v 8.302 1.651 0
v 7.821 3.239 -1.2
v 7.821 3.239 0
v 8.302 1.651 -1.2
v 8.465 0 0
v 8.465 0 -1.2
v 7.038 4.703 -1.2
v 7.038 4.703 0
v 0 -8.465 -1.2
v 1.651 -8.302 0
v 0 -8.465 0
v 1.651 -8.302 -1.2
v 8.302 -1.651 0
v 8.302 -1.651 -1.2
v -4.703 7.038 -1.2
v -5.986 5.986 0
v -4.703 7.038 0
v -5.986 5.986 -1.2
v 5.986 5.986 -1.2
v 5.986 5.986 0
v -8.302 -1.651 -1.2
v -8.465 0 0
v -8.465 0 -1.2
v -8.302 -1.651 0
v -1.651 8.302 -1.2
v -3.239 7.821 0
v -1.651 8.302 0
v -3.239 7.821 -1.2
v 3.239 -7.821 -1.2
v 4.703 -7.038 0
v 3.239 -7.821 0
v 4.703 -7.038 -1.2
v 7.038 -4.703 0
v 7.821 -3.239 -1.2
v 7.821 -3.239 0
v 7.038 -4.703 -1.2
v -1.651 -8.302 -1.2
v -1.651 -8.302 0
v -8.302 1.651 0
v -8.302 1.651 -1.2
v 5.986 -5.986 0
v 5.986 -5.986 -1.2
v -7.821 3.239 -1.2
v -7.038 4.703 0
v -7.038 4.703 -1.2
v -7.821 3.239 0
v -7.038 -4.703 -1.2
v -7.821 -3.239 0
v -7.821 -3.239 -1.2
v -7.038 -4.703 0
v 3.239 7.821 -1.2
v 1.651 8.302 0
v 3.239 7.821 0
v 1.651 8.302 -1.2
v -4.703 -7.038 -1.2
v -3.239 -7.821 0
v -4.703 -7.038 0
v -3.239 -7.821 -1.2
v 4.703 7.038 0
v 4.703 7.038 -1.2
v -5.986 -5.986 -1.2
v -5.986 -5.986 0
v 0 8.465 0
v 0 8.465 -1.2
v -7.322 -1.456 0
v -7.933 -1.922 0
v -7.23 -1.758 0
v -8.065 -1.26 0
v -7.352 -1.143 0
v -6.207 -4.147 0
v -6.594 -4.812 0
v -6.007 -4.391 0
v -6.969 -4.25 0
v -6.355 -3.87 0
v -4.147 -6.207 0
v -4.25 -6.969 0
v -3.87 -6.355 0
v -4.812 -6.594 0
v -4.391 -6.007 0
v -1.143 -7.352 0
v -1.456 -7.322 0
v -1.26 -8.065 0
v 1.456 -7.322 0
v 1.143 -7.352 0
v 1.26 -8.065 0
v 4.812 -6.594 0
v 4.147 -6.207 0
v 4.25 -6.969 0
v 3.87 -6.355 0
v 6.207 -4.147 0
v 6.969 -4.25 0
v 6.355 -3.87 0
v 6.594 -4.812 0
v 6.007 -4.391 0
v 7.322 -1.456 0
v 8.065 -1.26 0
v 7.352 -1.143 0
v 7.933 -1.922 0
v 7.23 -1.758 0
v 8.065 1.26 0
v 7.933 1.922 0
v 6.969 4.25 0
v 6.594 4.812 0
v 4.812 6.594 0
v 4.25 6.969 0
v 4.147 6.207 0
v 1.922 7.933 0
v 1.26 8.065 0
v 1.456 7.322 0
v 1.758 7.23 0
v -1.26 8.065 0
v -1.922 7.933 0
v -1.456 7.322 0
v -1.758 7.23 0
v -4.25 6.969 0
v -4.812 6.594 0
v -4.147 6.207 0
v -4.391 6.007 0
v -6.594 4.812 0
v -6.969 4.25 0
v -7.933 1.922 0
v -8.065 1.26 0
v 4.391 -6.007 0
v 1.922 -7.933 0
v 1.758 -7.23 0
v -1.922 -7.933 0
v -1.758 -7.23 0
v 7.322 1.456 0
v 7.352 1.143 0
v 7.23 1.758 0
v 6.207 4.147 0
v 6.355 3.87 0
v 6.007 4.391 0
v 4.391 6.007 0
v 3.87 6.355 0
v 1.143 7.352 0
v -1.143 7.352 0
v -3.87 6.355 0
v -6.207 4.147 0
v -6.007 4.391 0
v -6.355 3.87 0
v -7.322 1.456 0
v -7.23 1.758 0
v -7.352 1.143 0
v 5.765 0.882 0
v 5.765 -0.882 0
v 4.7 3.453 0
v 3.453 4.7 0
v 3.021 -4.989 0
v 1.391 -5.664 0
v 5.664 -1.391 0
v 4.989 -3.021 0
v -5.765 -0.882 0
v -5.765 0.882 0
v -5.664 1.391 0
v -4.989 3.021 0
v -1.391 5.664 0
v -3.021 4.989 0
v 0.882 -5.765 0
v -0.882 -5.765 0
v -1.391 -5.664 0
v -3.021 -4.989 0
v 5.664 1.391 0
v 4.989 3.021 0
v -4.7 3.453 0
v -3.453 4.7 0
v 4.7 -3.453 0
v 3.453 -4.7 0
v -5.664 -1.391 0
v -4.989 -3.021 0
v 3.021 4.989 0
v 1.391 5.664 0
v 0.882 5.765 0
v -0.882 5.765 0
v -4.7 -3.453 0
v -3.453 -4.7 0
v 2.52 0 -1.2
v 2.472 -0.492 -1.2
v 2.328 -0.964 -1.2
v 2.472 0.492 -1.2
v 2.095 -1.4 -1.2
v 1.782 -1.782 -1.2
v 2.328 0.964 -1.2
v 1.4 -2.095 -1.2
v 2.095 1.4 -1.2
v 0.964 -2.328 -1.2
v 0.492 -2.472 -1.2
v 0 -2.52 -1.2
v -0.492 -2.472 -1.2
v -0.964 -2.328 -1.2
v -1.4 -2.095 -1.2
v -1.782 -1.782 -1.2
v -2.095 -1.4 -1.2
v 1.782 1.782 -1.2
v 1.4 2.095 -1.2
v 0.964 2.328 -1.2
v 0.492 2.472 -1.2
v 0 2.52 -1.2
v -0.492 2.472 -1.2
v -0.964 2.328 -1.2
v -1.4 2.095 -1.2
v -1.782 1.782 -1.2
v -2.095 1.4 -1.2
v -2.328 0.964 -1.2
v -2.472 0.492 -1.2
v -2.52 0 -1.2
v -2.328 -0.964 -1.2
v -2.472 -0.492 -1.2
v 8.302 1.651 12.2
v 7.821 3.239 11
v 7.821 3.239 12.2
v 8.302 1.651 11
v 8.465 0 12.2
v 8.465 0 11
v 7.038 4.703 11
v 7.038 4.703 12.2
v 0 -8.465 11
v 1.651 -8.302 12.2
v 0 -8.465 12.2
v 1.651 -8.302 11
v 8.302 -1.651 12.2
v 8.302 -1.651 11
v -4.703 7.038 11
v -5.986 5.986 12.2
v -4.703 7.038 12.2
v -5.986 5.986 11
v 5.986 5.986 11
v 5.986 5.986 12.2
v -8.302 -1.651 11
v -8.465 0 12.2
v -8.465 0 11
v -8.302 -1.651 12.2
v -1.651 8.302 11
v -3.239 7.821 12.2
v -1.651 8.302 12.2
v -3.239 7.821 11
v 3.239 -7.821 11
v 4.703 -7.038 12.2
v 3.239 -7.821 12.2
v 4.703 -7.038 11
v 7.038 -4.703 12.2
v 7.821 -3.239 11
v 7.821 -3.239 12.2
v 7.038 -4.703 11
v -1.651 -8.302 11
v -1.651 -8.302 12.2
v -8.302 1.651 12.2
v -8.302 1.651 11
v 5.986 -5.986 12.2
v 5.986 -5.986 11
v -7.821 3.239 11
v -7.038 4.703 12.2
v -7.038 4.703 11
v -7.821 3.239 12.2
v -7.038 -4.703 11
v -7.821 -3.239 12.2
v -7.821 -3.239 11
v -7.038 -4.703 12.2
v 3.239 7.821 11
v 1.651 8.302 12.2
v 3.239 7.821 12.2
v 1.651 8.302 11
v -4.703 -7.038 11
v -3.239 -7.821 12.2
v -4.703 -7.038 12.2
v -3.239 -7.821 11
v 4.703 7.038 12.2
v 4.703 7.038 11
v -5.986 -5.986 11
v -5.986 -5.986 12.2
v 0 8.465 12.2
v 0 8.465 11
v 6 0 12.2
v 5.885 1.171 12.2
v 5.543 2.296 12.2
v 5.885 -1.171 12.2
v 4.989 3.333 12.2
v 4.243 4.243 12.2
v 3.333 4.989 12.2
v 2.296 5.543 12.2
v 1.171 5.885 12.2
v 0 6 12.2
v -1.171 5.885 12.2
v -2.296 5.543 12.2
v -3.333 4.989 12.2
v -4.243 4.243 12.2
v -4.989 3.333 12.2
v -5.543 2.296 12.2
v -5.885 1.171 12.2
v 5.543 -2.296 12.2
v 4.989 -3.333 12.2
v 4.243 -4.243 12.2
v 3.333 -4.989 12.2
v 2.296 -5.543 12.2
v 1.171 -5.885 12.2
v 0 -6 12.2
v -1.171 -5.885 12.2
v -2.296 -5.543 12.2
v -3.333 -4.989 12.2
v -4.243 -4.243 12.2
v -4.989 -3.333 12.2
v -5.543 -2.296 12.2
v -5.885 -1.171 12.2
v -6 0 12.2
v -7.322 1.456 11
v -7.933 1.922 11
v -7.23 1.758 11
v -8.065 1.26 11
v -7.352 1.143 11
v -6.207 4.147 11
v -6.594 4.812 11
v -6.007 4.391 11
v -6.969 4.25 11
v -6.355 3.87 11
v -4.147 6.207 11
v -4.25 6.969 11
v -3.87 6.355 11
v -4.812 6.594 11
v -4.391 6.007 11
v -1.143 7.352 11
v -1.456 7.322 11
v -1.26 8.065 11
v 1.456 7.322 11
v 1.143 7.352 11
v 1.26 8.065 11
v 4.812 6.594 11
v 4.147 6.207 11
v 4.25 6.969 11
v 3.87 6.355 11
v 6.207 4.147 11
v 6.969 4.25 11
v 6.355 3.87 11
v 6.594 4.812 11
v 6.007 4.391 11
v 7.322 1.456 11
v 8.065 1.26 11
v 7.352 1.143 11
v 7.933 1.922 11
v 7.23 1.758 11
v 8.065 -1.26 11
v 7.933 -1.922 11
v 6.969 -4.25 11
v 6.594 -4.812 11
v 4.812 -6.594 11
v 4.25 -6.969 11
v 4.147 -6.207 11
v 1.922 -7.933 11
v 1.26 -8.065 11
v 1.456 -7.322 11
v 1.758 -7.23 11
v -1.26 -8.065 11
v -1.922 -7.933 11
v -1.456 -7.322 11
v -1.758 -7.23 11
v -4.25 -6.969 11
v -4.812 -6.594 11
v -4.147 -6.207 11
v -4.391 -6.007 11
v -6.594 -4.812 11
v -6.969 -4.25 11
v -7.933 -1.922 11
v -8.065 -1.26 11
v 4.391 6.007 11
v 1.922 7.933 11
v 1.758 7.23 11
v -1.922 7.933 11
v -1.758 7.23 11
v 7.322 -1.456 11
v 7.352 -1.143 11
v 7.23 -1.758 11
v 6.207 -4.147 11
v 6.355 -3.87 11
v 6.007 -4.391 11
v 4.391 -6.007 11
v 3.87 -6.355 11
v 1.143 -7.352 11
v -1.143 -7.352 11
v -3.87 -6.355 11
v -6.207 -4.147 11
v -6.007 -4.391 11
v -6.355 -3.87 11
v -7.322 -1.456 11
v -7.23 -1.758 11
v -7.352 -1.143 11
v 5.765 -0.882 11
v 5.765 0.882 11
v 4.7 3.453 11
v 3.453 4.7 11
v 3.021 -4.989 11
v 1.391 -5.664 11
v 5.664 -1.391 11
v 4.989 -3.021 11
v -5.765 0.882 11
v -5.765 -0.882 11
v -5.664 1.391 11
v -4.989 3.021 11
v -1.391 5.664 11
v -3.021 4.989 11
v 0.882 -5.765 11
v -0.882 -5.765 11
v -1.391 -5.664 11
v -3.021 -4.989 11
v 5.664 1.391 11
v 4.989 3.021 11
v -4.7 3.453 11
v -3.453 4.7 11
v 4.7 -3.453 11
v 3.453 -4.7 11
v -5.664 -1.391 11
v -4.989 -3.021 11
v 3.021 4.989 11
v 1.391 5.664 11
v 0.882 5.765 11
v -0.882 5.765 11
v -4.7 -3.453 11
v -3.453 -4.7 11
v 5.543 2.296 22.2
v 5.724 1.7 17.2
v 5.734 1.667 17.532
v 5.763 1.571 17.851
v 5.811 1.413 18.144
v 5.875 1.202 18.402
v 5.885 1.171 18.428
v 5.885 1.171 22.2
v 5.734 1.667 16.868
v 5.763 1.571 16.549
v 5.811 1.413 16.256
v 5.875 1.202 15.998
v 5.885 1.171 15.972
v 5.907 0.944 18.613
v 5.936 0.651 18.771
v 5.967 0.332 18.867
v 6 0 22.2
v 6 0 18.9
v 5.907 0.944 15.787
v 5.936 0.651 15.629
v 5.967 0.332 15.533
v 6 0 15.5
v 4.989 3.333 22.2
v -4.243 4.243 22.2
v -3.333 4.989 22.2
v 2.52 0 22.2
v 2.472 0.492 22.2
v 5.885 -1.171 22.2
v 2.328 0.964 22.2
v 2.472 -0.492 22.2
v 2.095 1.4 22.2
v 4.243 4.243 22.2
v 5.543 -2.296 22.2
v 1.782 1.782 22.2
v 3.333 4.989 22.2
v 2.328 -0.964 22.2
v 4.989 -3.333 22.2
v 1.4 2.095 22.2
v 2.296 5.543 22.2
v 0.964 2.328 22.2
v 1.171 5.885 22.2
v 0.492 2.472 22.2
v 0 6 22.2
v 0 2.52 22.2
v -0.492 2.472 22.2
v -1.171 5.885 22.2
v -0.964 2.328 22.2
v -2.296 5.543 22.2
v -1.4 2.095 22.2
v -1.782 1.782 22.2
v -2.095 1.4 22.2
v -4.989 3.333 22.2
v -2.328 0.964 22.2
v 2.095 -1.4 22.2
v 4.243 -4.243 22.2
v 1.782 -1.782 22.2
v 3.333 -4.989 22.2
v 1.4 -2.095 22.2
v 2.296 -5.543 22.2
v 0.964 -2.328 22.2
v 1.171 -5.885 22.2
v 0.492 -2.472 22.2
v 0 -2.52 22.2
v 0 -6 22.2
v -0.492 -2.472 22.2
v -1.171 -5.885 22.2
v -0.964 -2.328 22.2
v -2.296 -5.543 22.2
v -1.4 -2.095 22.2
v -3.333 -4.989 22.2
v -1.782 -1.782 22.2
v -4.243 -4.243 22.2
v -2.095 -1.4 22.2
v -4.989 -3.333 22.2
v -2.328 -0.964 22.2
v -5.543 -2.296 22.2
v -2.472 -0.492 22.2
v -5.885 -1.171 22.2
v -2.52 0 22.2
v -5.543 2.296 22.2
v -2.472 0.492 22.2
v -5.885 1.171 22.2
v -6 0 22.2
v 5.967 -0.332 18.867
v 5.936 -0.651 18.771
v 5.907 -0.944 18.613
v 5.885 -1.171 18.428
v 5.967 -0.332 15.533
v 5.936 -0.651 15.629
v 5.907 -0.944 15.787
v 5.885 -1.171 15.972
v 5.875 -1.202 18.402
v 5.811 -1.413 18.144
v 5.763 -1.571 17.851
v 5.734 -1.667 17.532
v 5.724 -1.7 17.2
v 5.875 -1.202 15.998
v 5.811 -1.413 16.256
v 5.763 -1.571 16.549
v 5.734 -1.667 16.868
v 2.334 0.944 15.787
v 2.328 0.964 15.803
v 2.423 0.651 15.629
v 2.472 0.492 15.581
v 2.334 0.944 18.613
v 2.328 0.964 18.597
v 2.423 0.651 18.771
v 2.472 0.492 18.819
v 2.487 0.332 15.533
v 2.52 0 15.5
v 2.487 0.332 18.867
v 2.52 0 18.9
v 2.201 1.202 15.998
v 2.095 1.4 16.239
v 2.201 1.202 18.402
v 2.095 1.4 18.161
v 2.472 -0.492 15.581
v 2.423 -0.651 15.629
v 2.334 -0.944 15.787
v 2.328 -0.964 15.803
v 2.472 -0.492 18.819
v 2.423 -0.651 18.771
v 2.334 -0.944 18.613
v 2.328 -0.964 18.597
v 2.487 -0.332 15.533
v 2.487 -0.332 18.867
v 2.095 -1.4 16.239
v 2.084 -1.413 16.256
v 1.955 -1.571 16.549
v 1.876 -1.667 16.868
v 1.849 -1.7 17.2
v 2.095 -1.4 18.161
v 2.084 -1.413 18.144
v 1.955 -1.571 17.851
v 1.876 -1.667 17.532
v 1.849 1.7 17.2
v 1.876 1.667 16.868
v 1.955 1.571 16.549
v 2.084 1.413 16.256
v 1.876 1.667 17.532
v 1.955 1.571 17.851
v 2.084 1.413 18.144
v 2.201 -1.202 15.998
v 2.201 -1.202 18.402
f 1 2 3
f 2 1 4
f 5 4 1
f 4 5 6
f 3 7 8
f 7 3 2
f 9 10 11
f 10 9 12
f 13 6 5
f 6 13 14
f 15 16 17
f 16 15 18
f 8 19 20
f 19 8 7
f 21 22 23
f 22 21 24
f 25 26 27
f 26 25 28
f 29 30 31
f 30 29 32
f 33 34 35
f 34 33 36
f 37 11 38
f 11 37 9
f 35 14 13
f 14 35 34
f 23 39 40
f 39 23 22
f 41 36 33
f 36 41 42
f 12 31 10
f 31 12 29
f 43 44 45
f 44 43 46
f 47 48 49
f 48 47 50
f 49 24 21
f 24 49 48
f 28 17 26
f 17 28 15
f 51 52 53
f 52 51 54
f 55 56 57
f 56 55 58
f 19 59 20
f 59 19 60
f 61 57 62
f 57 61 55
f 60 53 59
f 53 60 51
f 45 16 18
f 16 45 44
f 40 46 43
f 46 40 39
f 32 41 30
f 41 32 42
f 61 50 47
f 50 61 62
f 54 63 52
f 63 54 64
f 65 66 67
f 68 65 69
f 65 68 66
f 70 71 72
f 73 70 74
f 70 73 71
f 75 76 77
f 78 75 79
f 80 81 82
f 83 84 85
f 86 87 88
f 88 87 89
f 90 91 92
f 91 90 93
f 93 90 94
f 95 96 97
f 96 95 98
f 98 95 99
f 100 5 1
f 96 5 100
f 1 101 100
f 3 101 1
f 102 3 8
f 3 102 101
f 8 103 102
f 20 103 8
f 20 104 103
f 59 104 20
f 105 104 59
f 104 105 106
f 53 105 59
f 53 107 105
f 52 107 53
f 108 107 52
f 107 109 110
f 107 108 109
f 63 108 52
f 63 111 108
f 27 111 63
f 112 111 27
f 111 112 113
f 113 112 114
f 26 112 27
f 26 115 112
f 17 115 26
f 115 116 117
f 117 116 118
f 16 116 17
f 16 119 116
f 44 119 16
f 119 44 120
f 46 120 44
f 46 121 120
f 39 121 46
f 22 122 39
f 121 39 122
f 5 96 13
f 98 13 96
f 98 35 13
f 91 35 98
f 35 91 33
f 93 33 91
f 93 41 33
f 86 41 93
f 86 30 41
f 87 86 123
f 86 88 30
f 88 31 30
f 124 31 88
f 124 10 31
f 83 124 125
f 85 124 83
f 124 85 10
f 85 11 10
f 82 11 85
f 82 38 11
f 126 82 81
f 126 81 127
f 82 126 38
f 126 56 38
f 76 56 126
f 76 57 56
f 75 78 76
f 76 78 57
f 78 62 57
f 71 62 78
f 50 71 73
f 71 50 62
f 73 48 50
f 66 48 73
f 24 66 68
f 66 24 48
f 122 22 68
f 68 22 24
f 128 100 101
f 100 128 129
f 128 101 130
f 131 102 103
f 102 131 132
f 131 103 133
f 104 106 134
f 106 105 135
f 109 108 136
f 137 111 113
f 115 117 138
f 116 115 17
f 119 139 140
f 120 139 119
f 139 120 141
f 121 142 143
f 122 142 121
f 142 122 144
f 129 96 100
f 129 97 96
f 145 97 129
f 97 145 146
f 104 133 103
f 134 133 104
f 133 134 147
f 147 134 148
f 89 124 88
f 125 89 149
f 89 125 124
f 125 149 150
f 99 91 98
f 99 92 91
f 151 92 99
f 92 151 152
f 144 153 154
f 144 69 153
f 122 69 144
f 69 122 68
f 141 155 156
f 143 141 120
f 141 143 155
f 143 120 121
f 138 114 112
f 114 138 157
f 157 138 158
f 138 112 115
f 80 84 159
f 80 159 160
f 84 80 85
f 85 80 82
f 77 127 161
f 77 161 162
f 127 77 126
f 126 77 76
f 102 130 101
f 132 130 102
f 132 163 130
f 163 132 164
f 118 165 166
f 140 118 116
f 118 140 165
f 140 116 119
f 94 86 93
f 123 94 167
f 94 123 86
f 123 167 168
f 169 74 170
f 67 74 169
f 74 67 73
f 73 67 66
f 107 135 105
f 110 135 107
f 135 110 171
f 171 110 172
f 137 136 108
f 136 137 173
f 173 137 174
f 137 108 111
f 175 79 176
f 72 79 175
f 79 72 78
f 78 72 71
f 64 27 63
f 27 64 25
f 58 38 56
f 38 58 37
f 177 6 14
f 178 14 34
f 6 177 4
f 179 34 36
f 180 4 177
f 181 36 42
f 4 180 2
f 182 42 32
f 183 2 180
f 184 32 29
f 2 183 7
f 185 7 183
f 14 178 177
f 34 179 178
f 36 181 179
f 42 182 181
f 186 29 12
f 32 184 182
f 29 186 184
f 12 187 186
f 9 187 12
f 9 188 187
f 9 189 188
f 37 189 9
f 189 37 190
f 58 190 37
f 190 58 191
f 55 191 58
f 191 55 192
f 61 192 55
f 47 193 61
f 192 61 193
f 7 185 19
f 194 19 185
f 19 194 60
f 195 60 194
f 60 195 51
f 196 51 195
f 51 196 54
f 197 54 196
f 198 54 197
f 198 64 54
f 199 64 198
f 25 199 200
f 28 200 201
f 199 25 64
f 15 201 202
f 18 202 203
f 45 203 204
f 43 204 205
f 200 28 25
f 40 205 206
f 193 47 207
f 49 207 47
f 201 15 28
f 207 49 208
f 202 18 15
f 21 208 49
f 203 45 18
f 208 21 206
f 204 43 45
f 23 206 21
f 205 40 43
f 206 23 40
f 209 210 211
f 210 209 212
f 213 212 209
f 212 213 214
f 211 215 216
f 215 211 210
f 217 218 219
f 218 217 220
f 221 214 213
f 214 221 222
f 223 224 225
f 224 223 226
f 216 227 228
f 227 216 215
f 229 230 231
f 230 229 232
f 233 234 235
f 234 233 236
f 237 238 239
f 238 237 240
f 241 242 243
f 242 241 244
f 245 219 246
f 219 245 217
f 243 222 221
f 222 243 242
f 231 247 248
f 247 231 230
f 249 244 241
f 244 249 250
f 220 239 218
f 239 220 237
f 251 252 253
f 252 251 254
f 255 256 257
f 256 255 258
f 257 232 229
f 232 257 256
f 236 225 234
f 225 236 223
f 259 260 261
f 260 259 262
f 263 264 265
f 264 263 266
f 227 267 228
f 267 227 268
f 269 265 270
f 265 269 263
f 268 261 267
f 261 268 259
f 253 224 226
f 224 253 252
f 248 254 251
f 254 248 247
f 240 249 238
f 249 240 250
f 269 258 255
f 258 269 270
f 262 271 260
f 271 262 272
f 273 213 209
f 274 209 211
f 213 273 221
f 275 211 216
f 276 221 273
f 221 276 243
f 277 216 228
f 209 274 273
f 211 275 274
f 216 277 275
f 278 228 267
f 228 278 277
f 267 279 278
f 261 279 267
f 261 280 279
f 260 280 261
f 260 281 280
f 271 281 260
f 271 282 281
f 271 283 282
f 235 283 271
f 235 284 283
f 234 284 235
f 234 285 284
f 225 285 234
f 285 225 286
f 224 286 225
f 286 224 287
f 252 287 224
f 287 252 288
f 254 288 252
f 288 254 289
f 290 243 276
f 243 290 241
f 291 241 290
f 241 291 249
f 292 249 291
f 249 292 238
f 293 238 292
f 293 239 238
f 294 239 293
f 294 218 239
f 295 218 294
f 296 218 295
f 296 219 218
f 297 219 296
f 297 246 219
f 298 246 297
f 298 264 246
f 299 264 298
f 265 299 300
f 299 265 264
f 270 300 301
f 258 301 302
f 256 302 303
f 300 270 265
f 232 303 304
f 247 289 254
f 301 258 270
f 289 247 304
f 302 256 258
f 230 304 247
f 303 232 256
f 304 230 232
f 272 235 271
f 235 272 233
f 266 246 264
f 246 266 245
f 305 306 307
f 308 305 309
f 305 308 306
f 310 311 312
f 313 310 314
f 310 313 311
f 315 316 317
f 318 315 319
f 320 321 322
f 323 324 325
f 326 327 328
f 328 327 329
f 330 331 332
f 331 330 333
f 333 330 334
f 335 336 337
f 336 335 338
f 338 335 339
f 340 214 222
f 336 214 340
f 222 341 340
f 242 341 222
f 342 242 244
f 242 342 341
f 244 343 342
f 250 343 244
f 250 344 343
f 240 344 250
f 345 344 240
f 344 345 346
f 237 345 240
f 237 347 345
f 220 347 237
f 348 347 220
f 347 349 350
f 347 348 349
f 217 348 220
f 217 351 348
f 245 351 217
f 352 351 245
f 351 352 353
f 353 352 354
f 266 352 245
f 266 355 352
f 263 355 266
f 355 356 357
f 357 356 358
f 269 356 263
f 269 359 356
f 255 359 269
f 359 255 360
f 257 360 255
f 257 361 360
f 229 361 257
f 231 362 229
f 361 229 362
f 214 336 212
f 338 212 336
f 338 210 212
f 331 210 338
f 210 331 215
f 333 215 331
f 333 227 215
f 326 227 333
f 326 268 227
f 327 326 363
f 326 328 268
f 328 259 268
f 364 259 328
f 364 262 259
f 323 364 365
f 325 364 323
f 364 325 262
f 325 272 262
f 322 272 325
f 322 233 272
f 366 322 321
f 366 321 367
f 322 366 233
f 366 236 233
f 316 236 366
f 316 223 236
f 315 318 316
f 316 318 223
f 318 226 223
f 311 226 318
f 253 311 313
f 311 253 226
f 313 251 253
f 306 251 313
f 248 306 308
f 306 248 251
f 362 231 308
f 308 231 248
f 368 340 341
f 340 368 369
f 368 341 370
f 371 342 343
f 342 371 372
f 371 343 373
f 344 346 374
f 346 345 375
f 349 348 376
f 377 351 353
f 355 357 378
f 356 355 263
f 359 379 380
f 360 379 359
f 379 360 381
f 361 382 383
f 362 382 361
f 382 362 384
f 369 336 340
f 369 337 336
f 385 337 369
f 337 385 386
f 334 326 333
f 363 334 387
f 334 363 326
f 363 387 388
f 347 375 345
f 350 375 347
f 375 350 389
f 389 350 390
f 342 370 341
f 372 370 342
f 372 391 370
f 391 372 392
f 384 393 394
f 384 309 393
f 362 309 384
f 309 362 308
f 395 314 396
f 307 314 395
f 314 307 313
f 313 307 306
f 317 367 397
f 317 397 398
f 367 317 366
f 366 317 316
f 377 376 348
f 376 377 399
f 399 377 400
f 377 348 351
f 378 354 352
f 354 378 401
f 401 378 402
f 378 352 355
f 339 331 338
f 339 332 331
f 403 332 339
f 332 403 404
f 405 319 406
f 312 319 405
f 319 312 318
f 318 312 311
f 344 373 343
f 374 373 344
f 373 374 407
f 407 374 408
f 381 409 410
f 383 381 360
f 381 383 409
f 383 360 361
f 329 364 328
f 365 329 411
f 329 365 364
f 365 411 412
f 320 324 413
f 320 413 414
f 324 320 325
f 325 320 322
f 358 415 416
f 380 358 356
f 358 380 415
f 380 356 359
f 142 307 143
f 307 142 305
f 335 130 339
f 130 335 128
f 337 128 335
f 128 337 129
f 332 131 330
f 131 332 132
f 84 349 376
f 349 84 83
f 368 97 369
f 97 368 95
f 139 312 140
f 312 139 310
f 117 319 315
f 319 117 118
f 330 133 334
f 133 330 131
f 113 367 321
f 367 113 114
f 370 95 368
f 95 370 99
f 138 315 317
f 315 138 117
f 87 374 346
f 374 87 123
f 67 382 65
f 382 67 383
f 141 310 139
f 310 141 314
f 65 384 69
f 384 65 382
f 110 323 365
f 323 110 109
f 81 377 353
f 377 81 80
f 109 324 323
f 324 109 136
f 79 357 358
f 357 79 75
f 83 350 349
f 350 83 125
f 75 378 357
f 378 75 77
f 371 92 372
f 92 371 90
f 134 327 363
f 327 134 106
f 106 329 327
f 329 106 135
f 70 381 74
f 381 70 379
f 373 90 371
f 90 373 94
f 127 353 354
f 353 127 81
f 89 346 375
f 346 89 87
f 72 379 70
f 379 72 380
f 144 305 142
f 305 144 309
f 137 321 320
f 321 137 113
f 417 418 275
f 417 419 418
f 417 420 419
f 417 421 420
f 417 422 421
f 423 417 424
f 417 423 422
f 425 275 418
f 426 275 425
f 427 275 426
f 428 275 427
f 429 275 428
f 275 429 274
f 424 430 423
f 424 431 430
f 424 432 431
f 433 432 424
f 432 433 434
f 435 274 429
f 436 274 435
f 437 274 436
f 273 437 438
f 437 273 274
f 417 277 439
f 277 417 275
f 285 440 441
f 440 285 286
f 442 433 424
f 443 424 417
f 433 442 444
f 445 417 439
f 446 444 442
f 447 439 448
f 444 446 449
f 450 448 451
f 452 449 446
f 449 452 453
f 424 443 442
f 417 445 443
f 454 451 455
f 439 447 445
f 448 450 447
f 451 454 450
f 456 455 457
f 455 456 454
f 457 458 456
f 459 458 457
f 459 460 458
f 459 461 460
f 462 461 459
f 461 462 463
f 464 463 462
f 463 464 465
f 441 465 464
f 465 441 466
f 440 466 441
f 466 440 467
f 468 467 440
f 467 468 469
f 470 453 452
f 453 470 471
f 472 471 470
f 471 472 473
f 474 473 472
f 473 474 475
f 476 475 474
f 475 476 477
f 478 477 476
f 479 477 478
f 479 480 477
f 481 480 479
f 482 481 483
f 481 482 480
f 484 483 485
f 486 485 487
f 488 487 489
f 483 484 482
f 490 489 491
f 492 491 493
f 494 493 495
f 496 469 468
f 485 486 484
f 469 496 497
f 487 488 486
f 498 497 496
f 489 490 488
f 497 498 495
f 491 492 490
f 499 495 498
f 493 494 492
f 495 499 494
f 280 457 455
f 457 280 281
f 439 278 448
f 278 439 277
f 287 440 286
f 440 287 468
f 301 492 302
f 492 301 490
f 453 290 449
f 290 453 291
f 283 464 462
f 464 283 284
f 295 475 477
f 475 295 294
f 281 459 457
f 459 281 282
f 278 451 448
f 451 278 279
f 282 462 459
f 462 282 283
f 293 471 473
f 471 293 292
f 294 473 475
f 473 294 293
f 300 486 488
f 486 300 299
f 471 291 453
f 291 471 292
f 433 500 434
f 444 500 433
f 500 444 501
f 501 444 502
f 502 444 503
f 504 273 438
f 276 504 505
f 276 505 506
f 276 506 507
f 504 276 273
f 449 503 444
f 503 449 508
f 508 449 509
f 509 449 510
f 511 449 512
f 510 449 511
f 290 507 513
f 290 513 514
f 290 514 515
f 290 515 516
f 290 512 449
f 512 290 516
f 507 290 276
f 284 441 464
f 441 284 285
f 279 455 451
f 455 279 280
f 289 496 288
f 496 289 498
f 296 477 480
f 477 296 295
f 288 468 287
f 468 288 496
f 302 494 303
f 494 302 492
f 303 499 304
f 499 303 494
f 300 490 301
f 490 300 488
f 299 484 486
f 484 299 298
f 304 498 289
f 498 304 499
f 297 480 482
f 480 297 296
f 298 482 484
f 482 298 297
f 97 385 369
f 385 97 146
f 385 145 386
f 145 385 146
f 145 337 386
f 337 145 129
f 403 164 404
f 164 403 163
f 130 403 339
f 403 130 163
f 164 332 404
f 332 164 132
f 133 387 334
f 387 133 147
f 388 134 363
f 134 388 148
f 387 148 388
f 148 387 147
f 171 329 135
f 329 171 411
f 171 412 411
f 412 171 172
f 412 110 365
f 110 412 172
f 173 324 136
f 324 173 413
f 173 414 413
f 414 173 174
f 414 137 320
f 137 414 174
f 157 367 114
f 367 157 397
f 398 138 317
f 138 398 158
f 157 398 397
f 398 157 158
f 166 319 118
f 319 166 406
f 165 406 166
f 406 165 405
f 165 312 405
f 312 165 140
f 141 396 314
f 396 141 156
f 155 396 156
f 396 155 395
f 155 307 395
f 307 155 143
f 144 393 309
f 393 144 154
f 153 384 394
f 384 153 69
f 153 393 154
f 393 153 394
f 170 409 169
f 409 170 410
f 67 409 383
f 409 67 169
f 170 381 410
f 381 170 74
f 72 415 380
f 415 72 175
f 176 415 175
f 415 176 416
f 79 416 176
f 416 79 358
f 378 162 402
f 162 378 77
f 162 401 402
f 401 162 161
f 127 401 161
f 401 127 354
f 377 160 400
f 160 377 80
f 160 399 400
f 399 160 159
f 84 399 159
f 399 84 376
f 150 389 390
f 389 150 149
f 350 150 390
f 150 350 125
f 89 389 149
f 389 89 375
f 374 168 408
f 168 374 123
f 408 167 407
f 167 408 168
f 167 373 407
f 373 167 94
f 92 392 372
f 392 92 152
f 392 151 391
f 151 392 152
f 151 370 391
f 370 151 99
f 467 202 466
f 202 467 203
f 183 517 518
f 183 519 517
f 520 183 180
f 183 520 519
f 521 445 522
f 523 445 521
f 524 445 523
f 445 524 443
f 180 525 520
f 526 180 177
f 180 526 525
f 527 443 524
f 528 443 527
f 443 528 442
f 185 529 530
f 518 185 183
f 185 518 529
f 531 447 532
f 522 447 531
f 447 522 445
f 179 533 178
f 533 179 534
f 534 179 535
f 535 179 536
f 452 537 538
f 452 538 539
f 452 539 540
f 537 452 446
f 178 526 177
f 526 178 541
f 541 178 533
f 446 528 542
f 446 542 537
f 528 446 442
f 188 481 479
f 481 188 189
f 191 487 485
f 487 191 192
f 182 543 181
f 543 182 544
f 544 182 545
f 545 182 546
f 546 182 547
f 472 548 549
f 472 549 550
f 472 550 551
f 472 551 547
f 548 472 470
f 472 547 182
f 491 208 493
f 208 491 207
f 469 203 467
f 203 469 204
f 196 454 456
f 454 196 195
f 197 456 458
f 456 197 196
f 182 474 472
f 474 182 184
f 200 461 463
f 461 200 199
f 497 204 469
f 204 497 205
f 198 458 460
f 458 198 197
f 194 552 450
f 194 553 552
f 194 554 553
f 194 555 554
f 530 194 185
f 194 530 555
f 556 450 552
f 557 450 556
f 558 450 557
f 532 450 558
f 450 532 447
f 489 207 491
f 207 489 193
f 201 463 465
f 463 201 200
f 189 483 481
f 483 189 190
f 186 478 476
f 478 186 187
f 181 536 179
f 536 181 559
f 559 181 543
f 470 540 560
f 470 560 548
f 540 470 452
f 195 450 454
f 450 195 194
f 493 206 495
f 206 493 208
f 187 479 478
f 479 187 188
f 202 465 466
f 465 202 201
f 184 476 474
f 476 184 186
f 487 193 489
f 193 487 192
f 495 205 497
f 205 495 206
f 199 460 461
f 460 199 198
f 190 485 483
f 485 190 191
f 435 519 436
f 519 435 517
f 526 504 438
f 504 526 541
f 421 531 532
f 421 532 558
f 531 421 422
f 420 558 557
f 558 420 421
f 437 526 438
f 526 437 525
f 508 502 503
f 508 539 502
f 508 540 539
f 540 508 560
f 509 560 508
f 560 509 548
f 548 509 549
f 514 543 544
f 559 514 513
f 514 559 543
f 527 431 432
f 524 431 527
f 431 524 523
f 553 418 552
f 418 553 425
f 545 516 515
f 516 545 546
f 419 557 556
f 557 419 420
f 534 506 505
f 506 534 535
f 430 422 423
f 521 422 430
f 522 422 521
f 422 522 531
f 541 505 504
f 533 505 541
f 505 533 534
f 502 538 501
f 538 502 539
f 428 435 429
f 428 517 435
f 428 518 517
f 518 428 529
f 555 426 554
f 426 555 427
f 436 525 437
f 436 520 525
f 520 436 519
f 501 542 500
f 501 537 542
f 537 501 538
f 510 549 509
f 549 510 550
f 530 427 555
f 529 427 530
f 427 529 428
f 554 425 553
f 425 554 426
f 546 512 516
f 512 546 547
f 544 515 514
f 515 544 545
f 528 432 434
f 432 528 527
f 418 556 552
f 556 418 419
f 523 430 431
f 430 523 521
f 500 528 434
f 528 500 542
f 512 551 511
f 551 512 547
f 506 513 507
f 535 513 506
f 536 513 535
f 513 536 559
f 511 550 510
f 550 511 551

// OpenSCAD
$fn = 32;

// ----------------------------------------------------------------------
// Timing pulley: GT3 16T, pitch 3 mm, 16.93 mm x 23.4 mm
// ----------------------------------------------------------------------

// --- parameters (mm) ---
pitch_mm = 3;             // belt pitch
tooth_count = 16;         // number of grooves
width = 11;               // belt width between the flanges
tip_d = 14.93;            // tip circle diameter
root_d = 12.73;           // groove bottom diameter
groove_h = 1.1;           // groove depth
tooth_w = 2.1;            // groove width at the tip circle
side_d = 16.93;           // flange diameter
side_t = 1.2;             // flange thickness
spigot_d = 11.13;         // flange spigot, sunk into the rim
spigot_h = 1.2;           // spigot depth into the rim
hub_bore = 5.04;          // shaft bore
hub_d = 12;               // hub diameter
hub_h = 10;               // hub above the flange
bottom_z = -1.2;          // lowest point of the pulley
top_z = 22.2;             // highest point of the pulley
set_d = 3.4;              // set screw tap hole

module rim() {
  cylinder(h = width, d = tip_d);
}

module groove_cutter() {
  /* belt tooth groove: deeper than wide, cut through the belt width */
  translate([root_d / 2, 0, 0])
    linear_extrude(height = width)
      polygon(points = [[-0.6, -tooth_w * 0.42], [groove_h + 0.6, -tooth_w * 0.6],
                        [groove_h + 0.6, tooth_w * 0.6], [-0.6, tooth_w * 0.42]]);
}

module flanges() {
  translate([0, 0, -side_t]) cylinder(h = side_t, d = side_d);
  translate([0, 0, width]) cylinder(h = side_t, d = side_d);
  translate([0, 0, -spigot_h]) cylinder(h = spigot_h + 0.6, d = spigot_d);
  translate([0, 0, width - 0.6]) cylinder(h = spigot_h + 0.6, d = spigot_d);
}

module hub() {
  translate([0, 0, bottom_z]) cylinder(h = top_z - bottom_z, d = hub_d);
}

difference() {
  union() {
    rim();
    hub();
    flanges();
  }
  for (i = [0 : tooth_count - 1]) rotate([0, 0, i * 360 / tooth_count]) groove_cutter();
  translate([0, 0, bottom_z - 1]) cylinder(h = top_z - bottom_z + 2, d = hub_bore);
  translate([-1, 0, top_z - hub_h * 0.5]) rotate([0, 90, 0]) cylinder(h = hub_d / 2 + 3, d = set_d);
}
